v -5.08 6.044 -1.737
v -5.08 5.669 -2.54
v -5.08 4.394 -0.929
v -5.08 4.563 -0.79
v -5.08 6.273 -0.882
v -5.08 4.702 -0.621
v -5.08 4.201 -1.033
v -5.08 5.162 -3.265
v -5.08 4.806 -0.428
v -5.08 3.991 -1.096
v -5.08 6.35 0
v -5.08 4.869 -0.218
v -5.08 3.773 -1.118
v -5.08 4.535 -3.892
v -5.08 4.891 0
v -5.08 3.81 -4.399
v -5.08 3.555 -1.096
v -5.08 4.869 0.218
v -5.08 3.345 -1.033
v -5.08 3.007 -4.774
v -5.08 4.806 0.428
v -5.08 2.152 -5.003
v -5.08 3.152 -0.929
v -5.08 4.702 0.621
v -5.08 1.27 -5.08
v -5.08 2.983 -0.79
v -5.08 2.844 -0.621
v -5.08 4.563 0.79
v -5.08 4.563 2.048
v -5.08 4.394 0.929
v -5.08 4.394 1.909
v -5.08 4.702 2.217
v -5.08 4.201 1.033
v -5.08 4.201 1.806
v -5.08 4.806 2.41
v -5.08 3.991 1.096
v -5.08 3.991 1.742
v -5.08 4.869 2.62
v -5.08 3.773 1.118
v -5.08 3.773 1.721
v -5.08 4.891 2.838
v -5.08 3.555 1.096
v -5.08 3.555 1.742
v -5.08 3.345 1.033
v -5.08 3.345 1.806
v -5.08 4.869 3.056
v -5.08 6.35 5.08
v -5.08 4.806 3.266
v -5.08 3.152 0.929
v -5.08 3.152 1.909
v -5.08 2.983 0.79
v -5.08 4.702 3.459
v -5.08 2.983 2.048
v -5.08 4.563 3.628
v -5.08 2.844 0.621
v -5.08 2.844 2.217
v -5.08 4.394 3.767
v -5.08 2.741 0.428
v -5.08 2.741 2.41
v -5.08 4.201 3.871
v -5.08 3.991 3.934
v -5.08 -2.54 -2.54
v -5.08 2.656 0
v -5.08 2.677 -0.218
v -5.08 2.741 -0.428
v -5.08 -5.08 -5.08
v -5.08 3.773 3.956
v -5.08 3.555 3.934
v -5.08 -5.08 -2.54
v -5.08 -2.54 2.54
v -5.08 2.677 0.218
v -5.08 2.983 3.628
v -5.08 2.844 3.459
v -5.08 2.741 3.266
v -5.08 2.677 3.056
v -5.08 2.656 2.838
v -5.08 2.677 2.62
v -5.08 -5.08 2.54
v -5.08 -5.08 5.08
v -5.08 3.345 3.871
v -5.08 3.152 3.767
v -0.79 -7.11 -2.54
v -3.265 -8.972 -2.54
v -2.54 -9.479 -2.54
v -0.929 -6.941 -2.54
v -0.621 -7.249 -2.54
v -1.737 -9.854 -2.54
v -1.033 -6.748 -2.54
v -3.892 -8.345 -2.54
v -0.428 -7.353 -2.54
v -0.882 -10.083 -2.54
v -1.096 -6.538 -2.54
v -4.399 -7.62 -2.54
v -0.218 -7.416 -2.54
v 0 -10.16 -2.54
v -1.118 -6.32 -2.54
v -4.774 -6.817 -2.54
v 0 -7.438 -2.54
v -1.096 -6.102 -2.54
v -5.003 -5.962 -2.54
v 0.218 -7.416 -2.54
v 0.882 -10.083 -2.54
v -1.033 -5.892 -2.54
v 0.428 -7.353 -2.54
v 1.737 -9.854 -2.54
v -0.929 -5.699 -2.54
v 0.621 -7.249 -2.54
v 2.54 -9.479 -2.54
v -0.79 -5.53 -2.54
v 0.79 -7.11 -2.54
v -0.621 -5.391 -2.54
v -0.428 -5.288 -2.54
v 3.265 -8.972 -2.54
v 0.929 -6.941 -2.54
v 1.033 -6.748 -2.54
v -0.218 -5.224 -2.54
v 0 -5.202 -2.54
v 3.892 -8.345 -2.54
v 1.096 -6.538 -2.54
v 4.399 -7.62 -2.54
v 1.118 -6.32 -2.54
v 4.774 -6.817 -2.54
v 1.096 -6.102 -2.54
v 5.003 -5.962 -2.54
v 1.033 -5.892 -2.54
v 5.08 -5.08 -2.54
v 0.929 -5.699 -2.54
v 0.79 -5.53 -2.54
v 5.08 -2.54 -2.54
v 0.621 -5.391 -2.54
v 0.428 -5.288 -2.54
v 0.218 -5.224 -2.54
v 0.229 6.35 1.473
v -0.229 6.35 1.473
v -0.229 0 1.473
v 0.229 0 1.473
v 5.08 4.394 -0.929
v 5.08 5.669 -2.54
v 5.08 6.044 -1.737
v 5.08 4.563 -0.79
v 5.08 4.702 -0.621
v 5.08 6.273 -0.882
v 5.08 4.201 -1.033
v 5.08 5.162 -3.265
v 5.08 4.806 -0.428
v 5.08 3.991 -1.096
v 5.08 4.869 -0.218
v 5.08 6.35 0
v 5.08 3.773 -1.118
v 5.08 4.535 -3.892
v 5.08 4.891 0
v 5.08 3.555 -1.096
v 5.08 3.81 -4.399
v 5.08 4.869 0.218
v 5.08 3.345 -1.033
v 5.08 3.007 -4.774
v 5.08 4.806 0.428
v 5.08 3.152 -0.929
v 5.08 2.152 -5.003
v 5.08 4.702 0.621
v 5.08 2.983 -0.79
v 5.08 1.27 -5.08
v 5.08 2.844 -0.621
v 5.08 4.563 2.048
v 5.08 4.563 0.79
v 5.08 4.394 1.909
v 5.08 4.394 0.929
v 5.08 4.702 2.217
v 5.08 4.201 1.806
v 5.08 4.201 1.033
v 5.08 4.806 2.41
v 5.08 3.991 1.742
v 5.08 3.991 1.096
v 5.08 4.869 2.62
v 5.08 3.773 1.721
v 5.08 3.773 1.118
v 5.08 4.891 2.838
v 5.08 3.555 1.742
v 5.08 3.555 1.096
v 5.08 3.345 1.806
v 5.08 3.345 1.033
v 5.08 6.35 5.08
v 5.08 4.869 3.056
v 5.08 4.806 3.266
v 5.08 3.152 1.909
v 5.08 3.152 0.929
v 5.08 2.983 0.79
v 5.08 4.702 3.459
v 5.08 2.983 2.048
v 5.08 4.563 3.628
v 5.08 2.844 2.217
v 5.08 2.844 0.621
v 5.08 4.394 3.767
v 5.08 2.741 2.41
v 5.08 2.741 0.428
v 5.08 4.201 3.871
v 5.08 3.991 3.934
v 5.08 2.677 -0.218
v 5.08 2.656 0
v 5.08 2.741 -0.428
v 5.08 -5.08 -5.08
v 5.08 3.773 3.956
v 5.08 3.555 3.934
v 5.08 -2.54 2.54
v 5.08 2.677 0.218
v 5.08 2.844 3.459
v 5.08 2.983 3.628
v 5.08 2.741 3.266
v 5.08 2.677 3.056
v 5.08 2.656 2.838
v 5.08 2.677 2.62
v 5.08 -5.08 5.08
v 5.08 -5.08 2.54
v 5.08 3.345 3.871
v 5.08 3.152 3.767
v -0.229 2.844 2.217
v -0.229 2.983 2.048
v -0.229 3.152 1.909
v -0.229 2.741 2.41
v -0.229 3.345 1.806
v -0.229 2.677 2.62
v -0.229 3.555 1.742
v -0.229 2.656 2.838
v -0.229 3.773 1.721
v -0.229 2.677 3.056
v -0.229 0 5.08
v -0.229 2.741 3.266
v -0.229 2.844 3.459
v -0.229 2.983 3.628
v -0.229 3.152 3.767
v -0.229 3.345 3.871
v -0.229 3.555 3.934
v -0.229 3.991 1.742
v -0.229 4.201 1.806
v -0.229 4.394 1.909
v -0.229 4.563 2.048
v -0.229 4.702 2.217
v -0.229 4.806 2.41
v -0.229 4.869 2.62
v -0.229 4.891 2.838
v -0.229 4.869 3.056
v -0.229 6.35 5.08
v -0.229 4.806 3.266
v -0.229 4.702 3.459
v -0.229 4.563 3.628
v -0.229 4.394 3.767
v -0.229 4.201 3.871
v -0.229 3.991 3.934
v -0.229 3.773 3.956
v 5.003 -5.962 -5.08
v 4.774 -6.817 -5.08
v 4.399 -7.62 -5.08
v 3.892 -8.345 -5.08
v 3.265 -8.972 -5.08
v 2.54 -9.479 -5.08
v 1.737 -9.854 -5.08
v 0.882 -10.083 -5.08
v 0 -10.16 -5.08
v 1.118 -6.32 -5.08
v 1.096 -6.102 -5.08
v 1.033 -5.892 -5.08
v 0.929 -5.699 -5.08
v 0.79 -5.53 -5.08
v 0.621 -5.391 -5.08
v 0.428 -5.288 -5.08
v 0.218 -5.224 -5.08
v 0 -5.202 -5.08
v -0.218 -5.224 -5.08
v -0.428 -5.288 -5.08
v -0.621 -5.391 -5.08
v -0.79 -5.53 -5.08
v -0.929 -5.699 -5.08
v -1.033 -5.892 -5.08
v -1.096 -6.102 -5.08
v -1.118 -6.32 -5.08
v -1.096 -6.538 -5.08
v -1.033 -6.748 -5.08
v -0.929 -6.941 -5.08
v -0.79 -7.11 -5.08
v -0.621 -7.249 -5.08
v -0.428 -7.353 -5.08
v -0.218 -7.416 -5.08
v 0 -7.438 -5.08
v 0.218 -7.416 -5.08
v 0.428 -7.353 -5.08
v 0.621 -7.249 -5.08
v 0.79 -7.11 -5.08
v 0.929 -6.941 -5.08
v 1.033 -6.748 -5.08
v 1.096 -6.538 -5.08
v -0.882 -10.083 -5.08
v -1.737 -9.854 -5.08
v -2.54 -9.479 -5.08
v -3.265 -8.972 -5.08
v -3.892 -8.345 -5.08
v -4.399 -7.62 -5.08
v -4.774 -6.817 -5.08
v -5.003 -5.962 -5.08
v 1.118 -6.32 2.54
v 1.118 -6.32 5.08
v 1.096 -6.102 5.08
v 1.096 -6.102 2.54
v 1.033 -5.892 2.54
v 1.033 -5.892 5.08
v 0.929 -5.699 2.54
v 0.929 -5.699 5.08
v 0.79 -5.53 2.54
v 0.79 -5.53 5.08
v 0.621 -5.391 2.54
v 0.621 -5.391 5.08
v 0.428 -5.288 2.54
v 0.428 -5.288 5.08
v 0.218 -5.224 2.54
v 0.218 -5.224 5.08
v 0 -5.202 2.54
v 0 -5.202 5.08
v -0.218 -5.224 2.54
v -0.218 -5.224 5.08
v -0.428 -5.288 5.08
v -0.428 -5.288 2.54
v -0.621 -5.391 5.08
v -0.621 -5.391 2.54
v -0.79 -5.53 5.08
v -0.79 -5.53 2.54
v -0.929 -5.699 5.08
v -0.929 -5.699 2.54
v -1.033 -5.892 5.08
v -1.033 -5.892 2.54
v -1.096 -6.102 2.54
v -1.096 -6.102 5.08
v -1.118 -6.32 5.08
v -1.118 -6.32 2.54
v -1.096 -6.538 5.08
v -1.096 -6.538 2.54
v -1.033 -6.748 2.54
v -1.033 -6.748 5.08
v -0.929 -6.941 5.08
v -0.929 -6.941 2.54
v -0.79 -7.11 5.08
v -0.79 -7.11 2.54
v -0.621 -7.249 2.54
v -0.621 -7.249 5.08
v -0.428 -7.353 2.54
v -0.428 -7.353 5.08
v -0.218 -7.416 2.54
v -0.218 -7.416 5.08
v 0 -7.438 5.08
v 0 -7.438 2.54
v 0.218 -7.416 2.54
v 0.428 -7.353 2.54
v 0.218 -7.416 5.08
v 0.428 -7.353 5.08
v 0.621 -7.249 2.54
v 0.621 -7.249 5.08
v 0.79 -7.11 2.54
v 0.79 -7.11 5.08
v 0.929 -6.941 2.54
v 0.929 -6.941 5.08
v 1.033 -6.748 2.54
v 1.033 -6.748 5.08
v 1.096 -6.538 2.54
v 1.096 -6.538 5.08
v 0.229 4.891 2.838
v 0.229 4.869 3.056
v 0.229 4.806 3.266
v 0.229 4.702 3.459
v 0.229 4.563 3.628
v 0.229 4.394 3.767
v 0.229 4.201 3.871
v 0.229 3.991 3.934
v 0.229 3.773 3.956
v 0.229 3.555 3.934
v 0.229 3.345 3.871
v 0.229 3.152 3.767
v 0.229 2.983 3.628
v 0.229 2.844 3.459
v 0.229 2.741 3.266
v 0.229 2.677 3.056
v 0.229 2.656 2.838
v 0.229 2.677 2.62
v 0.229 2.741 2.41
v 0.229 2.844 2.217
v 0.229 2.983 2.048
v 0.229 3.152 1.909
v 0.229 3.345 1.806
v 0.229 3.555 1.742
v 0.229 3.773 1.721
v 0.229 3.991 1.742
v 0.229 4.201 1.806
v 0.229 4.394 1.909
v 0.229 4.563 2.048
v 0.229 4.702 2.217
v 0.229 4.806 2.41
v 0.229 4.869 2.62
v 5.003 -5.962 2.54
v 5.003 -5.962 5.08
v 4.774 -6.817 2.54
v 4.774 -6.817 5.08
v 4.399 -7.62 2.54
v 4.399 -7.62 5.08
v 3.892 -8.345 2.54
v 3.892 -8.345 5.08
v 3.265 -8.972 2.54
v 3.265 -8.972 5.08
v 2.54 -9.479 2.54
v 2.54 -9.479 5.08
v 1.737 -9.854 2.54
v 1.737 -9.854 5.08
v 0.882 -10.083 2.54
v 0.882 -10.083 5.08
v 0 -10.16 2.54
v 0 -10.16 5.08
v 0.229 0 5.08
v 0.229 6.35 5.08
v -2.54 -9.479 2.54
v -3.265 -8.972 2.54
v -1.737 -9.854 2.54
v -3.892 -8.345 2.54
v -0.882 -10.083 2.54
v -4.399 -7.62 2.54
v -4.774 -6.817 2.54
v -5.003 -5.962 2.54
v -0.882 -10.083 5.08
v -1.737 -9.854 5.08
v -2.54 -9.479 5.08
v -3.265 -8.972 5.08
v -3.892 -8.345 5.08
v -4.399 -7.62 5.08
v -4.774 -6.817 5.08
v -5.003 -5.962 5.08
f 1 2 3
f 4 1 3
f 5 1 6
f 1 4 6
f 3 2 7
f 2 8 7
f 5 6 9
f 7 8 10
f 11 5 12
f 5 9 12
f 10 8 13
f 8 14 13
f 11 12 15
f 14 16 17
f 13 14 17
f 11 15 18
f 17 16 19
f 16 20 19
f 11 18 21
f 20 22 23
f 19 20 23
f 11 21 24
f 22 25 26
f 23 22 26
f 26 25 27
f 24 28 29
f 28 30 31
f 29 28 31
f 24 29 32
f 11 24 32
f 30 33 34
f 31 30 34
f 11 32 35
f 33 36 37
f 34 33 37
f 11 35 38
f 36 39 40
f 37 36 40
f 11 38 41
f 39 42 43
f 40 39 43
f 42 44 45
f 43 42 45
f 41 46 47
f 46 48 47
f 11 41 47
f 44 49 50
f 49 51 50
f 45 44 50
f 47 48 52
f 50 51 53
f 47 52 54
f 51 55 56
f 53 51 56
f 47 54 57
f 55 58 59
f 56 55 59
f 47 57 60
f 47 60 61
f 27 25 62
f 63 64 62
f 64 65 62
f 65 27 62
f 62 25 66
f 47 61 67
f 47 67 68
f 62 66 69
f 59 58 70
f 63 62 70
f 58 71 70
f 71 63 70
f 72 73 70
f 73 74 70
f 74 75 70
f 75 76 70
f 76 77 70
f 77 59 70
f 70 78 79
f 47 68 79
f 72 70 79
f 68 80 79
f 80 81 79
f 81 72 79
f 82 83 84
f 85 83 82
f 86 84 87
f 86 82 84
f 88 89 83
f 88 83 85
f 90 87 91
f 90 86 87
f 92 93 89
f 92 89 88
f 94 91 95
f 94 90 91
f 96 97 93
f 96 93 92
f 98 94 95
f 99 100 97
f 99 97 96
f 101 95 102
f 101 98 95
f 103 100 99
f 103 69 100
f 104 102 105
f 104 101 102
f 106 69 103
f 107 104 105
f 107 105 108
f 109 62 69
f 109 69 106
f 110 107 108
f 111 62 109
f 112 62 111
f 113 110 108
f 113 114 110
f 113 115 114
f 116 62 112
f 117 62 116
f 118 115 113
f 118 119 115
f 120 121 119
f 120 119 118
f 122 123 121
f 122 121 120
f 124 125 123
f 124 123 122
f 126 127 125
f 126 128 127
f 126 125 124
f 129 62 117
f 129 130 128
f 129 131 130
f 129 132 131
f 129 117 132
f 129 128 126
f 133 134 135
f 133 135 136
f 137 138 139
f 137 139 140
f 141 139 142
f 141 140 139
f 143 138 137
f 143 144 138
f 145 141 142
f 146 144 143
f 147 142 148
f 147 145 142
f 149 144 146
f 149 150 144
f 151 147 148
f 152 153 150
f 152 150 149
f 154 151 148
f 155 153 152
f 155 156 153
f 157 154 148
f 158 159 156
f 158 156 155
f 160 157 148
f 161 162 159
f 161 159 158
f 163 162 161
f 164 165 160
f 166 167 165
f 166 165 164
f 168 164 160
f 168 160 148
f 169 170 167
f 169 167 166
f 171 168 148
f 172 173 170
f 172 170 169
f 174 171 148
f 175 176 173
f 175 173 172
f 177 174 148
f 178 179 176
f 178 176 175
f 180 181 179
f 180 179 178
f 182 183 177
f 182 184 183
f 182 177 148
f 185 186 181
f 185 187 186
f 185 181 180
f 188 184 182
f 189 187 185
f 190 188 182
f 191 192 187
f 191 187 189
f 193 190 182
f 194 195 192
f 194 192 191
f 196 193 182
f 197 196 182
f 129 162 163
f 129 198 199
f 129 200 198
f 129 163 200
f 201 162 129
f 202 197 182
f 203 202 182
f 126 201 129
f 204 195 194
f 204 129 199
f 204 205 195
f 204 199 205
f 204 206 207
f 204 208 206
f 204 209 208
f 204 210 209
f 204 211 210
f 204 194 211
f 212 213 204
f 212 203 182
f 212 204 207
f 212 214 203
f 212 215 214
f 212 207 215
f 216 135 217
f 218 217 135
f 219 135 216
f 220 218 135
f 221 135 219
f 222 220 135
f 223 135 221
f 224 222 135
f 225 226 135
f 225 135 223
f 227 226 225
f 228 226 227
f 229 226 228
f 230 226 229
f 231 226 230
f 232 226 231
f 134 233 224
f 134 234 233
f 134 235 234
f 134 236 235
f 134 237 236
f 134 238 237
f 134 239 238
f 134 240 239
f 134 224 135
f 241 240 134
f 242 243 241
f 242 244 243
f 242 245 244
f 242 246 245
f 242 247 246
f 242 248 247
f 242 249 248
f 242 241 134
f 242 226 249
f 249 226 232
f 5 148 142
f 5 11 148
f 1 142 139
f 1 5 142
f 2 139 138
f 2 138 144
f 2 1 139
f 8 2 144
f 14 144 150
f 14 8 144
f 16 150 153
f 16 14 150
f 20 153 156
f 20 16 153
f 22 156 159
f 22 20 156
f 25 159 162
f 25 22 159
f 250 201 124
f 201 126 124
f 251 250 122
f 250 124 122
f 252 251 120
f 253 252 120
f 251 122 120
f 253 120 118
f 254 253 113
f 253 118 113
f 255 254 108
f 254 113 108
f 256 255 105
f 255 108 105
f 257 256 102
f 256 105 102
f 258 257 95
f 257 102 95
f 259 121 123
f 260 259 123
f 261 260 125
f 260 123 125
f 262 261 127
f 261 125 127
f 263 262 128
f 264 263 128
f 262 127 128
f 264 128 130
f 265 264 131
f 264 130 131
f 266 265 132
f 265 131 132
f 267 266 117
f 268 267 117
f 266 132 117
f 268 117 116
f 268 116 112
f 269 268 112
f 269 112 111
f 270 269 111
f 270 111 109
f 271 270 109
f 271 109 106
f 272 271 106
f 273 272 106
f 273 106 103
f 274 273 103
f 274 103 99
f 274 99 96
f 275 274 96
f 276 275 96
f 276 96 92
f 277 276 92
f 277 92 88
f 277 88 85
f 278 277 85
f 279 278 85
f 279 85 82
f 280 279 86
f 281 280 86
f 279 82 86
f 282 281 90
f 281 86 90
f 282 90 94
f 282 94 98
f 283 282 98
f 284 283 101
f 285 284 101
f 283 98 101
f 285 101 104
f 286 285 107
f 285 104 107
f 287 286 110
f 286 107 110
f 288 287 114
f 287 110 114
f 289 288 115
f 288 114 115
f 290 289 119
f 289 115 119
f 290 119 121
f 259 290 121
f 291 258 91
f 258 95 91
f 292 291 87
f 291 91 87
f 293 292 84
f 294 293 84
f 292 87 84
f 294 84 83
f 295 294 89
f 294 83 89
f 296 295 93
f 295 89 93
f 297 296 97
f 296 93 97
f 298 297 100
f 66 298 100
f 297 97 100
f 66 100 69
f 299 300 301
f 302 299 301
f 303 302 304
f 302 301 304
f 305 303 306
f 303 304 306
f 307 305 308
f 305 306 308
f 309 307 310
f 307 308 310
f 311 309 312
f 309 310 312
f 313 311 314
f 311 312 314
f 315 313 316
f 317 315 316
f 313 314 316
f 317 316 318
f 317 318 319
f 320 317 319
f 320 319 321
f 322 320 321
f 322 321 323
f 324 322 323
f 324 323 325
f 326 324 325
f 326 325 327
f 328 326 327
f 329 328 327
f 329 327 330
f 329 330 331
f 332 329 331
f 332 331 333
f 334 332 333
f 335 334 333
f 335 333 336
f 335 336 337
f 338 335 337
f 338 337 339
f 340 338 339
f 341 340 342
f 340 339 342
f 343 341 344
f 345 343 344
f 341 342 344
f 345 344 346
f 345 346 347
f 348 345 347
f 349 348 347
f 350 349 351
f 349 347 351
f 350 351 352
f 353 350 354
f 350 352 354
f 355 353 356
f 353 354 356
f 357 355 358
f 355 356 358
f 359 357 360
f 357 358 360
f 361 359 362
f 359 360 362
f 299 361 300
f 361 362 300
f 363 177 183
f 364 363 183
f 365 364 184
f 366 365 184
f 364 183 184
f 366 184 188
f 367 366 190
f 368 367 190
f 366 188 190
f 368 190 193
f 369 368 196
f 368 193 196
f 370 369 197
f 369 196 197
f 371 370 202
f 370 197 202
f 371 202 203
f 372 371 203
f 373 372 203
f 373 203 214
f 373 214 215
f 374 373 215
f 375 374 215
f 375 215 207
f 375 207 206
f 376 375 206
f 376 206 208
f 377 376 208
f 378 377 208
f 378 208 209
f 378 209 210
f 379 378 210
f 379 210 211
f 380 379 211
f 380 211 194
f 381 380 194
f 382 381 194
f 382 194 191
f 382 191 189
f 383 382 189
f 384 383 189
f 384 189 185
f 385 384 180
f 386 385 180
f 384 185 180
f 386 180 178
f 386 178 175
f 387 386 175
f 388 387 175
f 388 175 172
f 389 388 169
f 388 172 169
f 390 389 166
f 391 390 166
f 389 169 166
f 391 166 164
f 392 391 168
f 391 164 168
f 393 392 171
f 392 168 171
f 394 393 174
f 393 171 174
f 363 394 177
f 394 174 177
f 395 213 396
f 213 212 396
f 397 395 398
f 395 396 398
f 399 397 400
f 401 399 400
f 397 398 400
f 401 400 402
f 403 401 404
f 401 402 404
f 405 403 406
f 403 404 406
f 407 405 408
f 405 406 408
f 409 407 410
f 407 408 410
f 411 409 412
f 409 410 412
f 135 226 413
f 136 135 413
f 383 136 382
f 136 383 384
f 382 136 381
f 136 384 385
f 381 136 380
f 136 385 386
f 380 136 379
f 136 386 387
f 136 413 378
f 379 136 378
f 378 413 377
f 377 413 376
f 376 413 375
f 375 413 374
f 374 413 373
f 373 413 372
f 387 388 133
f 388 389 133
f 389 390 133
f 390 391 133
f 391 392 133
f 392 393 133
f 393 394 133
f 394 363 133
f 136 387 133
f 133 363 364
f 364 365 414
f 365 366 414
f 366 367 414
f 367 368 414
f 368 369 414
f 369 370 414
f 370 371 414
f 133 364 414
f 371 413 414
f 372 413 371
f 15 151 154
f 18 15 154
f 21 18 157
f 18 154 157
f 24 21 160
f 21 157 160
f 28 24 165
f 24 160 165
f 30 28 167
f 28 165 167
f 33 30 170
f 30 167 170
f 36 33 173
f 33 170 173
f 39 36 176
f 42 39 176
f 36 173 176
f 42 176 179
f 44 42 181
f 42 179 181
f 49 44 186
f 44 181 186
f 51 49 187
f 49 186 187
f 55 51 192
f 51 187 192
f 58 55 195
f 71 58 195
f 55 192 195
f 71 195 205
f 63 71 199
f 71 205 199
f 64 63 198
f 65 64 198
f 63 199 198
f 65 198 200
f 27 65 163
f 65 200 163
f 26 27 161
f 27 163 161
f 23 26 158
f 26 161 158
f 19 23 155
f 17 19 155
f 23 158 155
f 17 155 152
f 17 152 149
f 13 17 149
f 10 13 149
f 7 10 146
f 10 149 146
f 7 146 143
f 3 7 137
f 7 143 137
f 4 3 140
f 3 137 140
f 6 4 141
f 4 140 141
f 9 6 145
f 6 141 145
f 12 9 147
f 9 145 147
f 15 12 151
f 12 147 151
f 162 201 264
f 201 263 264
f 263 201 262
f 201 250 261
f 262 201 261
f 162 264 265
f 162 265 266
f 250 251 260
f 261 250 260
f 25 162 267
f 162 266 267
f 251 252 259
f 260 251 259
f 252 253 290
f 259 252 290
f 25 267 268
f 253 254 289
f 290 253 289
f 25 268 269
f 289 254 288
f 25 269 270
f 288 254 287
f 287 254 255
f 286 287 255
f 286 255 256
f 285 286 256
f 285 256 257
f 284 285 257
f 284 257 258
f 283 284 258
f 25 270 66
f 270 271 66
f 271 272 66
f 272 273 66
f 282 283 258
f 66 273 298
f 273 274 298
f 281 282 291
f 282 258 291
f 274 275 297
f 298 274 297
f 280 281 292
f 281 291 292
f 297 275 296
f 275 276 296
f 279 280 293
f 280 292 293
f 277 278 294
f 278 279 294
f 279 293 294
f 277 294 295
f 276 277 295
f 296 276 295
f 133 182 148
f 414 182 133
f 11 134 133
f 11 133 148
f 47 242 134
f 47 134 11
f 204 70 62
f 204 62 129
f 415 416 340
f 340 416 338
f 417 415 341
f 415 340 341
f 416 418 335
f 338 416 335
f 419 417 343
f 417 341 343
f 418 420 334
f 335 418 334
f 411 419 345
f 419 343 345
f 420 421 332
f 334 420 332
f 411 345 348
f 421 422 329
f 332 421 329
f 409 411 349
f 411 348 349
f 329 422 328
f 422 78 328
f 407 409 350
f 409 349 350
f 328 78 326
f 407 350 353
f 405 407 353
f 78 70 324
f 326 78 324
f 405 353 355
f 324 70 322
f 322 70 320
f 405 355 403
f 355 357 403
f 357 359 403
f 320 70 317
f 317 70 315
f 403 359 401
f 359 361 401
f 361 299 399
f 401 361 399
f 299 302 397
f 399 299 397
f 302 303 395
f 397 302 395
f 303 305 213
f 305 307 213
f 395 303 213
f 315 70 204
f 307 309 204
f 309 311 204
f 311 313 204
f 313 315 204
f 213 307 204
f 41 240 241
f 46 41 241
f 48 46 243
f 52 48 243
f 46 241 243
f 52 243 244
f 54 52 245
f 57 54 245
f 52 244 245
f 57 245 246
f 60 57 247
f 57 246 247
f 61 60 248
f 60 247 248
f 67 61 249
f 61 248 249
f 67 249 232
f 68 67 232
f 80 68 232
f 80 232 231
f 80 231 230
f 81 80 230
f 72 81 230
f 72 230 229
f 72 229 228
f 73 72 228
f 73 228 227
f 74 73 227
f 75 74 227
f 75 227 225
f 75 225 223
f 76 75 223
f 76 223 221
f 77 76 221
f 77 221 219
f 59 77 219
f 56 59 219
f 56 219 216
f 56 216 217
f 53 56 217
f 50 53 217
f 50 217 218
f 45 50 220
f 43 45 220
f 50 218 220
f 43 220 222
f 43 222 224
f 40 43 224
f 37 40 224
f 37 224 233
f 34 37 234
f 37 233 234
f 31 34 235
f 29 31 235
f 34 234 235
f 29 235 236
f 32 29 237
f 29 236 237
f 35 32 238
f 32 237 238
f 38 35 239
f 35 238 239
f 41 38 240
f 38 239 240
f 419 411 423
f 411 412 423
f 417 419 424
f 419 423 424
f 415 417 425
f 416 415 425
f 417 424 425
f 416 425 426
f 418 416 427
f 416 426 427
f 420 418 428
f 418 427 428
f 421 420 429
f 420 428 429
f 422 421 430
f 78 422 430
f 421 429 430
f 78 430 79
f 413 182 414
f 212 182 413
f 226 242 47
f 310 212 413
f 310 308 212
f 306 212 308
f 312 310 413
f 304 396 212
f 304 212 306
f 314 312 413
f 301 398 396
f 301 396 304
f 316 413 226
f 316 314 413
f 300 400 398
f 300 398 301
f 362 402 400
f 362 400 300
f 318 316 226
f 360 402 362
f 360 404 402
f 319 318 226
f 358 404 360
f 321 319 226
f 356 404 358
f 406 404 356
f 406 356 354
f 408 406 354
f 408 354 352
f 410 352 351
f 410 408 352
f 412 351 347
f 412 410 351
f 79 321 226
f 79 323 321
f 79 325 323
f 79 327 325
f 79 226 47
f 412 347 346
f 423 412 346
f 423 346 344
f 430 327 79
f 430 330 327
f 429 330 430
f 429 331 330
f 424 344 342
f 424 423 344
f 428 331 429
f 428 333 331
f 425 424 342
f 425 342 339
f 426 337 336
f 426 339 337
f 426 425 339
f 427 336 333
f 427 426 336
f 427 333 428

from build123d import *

# Parameters (mm, degrees)
F0_W      = 10.16
F0_H      = 10.16
F1_DEPTH  = 10.16
F2_T      = -2.54
F3_W      = 10.16
F3_H      = 10.16
F4_DEPTH  = 6.35
F5_R      = 1.1176
F6_DEPTH  = 10.16
F7_R      = 1.1176
F8_DEPTH  = 10.16
F9_R      = 5.07999
F10_W     = 0.4572
F10_H     = 6.35
F11_DEPTH = 3.6068


# Not quite as in the source:
# - a fillet or chamfer is up to 0.001 mm smaller than in the source, because OpenCascade refuses the exact size


with BuildPart() as f1:
    # F0 (on Front) → F1 (new body)
    with BuildSketch(Plane.XZ):
        Rectangle(F0_W, F0_H)
    extrude(amount=F1_DEPTH)

    # F2
    f2_openings = [f1.faces().sort_by_distance(p)[0] for p in [
        (0, -10.16, 0),
        (5.08, -5.08, 0),
        (-5.08, -5.08, 0),
    ]]
    offset(amount=F2_T, openings=f2_openings)

    # F3 (on face) → F4 (join)
    with BuildSketch(Plane(origin=(0, 0, 0), x_dir=(-1, 0, 0), z_dir=(0, 1, 0))):
        Rectangle(F3_W, F3_H)
    extrude(amount=F4_DEPTH)

    # F5 (on face) → F6 (cut)
    with BuildSketch(Plane.YZ.offset(5.08)):
        with Locations((3.7731814664, 0)):
            Circle(F5_R)
        with Locations((3.7731814664, 2.838186454)):
            Circle(F5_R)
    extrude(amount=-F6_DEPTH, mode=Mode.SUBTRACT)

    # F7 (on face) → F8 (cut)
    with BuildSketch(Plane.XY.offset(5.08)):
        with Locations((0, -6.3200981603)):
            Circle(F7_R)
    extrude(amount=-F8_DEPTH, mode=Mode.SUBTRACT)

    # F9 (radius 5.08 in the source; OpenCascade refuses exactly that, so slightly less here)
    f9_edges = [f1.edges().sort_by_distance(p)[0] for p in [
        (5.08, -10.16, -3.81),
        (5.08, -10.16, 3.81),
        (-5.08, -10.16, 3.81),
        (-5.08, -10.16, -3.81),
        (0, 6.35, -5.08),
    ]]
    fillet(f9_edges, radius=F9_R)

    # F10 (on face) → F11 (cut)
    with BuildSketch(Plane.XY.offset(5.08)):
        with Locations((0, 3.175)):
            Rectangle(F10_W, F10_H)
    extrude(amount=-F11_DEPTH, mode=Mode.SUBTRACT)


solid = f1.part
